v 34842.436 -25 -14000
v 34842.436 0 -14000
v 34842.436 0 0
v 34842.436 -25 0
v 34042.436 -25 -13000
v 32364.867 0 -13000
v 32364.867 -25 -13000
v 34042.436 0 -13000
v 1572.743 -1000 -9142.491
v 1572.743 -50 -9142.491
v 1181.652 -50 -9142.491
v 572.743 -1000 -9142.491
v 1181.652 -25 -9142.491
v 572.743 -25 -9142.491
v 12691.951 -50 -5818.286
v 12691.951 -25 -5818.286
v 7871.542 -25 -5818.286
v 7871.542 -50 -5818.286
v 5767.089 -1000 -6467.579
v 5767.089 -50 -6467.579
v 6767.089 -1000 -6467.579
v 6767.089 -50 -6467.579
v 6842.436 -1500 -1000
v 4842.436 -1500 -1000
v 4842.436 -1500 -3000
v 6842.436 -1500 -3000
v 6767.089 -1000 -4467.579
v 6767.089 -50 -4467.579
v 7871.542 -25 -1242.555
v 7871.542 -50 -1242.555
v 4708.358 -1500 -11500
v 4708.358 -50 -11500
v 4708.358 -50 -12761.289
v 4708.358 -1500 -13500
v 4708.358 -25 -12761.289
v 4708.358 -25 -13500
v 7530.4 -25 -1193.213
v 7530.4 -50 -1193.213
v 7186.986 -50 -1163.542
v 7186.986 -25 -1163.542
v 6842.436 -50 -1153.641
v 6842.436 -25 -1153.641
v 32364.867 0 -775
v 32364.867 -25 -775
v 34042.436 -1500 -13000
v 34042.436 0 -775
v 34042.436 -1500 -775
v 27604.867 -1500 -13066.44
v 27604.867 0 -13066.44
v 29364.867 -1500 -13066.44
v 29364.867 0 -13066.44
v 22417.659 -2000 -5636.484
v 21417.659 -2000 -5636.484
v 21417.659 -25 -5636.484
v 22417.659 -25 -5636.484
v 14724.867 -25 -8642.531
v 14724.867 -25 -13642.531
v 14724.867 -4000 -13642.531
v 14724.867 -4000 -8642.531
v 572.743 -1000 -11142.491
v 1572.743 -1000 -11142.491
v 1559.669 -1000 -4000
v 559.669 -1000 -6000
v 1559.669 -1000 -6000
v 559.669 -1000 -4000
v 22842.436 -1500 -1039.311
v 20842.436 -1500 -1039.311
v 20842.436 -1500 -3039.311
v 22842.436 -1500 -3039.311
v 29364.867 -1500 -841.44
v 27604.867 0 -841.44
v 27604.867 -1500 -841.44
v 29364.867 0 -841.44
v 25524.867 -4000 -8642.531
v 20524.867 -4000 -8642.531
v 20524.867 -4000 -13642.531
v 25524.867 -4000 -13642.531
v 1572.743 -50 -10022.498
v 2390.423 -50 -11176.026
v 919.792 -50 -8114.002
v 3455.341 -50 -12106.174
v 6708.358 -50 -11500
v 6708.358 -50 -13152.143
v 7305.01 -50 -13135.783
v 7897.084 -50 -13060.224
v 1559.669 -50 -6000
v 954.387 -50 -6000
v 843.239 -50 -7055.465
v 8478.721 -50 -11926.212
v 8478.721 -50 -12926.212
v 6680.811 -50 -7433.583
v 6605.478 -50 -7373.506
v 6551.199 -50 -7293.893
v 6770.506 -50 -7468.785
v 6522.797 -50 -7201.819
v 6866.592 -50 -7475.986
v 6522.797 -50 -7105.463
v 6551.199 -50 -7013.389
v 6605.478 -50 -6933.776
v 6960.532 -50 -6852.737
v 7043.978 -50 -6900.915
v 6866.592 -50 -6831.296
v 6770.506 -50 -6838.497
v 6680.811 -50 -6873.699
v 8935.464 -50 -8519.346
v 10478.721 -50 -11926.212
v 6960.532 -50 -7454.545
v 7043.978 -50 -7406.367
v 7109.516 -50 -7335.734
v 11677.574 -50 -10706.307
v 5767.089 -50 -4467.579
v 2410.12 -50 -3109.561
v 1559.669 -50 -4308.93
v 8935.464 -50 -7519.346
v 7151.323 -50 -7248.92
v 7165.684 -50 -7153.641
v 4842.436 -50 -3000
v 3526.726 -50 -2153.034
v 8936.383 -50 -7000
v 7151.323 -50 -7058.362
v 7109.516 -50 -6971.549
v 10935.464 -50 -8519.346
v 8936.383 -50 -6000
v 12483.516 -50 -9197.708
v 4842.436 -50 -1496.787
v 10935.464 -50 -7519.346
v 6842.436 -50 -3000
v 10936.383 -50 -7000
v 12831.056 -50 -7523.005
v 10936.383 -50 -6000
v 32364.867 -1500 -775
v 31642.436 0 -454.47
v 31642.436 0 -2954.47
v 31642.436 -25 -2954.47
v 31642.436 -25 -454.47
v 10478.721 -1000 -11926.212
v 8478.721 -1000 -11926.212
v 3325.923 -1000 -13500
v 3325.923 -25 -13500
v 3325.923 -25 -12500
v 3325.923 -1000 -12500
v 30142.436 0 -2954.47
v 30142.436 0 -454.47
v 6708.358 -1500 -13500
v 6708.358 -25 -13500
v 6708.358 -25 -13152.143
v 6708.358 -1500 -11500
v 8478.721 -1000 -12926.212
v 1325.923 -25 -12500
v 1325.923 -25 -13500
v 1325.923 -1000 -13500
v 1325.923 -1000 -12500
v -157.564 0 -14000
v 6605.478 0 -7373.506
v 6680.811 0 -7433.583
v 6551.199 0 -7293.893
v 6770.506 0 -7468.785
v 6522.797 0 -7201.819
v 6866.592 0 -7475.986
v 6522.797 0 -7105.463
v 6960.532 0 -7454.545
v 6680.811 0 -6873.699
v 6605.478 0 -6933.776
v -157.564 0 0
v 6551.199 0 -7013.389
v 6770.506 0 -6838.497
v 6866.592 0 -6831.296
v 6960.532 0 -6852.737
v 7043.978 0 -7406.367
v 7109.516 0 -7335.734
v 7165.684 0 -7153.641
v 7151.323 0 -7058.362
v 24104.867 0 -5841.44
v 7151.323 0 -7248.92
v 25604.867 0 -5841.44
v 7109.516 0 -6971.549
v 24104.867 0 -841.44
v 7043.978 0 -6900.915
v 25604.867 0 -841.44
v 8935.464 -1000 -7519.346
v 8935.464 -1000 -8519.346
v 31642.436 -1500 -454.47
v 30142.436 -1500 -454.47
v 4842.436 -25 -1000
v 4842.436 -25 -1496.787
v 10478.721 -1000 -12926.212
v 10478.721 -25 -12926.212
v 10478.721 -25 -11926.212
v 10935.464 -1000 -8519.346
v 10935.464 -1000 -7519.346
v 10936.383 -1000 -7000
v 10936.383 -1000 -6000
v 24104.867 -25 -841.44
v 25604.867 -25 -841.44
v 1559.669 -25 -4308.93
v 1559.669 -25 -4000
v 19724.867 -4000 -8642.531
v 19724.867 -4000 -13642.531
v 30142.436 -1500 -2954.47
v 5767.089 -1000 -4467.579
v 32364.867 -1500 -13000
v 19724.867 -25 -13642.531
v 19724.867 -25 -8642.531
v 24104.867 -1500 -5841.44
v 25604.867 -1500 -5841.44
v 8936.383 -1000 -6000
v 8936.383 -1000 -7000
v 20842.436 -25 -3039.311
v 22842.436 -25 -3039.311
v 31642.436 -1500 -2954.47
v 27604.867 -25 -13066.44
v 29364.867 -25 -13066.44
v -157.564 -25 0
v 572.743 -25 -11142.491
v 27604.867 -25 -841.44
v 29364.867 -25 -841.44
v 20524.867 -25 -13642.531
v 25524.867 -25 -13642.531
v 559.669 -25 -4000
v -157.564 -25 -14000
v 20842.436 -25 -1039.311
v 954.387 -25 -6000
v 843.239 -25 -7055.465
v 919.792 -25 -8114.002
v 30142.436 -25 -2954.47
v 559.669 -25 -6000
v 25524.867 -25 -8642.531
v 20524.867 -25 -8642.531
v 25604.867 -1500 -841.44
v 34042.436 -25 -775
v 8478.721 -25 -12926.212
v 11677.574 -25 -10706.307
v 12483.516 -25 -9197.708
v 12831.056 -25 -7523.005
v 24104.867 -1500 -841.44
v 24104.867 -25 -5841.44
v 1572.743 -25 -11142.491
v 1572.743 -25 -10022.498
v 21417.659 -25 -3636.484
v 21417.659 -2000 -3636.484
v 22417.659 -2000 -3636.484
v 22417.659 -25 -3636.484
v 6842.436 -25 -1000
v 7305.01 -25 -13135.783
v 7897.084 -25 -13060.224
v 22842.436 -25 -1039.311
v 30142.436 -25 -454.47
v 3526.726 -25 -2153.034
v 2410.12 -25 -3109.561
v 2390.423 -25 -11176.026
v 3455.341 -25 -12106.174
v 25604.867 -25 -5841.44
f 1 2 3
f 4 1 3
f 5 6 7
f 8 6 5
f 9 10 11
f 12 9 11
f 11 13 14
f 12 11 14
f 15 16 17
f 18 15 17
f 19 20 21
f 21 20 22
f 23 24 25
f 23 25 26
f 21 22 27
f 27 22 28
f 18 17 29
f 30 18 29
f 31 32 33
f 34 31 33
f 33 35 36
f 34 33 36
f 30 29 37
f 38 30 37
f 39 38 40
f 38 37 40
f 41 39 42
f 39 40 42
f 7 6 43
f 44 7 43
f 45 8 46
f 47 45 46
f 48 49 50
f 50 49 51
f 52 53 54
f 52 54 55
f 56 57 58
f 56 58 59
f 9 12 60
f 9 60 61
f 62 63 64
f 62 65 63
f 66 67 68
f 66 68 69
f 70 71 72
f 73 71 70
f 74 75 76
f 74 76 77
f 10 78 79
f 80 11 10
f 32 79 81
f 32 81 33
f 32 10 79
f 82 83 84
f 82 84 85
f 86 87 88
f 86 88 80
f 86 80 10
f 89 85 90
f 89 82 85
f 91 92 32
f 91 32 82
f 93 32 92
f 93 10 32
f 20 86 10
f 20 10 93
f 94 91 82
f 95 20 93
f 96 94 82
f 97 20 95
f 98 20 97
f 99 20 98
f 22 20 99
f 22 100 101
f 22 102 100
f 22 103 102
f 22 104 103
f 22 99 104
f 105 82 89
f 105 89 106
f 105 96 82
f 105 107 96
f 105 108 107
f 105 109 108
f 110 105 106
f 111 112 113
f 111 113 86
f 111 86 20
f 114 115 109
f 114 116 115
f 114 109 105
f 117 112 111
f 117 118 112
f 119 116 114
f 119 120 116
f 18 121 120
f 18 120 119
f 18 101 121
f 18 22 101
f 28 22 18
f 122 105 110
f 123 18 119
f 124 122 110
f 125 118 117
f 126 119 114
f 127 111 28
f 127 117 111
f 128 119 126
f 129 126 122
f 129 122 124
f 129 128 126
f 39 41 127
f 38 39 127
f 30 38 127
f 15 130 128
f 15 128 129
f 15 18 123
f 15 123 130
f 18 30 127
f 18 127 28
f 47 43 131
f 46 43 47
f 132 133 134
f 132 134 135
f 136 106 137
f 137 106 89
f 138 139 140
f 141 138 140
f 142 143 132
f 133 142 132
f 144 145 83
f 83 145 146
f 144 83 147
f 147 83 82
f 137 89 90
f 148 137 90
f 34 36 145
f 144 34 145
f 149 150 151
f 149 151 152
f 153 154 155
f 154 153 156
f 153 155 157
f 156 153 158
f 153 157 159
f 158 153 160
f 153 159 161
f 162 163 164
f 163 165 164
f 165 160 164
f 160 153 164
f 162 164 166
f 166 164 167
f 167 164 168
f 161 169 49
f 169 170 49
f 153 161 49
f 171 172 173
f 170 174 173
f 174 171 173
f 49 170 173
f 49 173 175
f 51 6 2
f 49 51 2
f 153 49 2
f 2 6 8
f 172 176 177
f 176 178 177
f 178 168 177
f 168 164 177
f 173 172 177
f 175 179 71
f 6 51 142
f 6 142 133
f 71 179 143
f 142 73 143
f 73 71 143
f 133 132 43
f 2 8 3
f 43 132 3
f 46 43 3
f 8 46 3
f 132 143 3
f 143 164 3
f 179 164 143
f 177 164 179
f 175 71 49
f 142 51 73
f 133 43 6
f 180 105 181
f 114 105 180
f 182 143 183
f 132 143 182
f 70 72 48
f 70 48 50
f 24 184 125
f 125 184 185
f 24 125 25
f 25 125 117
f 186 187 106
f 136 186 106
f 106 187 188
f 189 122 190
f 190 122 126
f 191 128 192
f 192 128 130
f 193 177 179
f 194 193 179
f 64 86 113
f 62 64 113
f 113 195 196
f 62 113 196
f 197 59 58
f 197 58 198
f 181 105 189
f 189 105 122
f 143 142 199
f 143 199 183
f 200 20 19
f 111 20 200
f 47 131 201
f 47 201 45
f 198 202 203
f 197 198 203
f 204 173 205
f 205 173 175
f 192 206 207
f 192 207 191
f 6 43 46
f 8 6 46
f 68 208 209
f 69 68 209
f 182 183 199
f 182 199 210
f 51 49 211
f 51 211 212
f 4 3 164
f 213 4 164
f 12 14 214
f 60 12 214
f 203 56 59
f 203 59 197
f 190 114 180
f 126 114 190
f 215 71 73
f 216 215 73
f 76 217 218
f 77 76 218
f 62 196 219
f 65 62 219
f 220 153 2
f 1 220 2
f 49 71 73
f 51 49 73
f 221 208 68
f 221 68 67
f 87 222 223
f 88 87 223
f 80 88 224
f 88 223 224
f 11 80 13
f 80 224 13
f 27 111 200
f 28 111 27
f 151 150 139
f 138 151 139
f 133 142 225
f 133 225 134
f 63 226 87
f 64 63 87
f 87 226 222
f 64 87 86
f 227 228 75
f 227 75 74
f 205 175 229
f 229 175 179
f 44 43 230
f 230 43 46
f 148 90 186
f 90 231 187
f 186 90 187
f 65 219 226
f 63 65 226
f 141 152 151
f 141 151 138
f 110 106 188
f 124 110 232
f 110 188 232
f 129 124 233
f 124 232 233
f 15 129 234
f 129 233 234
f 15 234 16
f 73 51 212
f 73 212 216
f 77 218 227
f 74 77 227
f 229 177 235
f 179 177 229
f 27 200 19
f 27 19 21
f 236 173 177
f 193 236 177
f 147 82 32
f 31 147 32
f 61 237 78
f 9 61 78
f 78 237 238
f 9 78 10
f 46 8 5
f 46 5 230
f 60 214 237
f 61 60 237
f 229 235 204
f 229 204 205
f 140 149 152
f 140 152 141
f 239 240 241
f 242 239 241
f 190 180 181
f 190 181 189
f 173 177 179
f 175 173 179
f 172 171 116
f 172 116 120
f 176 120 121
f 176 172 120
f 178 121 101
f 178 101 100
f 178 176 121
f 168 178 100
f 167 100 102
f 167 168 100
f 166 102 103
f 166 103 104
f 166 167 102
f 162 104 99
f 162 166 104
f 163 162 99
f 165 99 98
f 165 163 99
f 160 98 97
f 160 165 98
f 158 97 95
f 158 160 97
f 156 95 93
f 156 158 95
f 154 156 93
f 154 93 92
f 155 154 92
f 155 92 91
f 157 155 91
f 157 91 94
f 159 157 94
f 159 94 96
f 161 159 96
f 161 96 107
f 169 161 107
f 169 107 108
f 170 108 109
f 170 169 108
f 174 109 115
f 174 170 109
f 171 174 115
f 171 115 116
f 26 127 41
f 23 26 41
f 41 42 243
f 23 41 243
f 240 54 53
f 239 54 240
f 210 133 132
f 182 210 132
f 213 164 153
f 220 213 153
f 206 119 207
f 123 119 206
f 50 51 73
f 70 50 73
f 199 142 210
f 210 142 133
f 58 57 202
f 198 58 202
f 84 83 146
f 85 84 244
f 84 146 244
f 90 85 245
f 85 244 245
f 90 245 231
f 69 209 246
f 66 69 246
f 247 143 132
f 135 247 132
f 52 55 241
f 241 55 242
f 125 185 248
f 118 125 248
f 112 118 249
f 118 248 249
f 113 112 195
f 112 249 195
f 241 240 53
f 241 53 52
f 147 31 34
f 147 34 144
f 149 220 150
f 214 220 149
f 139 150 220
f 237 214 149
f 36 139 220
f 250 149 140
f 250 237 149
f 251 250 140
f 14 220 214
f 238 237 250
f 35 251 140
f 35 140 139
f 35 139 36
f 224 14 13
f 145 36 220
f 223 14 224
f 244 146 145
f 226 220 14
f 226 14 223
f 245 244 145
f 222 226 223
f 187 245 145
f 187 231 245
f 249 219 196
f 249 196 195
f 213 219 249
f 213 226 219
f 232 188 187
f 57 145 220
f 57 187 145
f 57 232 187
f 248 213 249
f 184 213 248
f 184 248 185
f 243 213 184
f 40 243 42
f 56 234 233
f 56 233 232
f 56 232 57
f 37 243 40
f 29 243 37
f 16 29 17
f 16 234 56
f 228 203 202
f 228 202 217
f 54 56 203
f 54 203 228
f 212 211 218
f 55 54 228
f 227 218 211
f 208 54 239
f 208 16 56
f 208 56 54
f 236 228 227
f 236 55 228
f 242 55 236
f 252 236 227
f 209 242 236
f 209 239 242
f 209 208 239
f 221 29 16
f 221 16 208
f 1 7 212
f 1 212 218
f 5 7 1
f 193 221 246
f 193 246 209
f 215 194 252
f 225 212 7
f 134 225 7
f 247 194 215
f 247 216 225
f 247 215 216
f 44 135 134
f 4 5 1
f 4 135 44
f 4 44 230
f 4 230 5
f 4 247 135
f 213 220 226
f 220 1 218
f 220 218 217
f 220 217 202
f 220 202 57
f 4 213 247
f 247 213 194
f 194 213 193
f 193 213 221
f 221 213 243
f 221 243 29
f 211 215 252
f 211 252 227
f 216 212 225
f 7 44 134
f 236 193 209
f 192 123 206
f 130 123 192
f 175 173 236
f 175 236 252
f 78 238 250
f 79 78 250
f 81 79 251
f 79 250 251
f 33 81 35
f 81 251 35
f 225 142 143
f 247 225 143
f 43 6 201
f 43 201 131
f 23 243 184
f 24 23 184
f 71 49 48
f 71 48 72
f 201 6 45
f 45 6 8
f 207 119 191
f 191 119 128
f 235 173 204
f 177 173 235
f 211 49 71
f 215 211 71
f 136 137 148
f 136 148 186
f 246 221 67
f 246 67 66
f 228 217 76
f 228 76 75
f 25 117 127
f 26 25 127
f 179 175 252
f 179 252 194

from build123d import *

# Parameters (mm, degrees)
F0_W     = 1677.5682196007
F0_H     = 12225
F1_DEPTH = 1500
F0_W_2   = 1760
F0_W_3   = 1500
F0_H_2   = 5000
F0_H_3   = 2500
F0_W_4   = 2000
F0_H_4   = 1000
F0_W_5   = 5000
F0_W_6   = 1000
F0_H_5   = 2000
F0_W_7   = 4531.0974121094
F0_H_6   = 6739.2702102661
F2_DEPTH = 25
F3_DEPTH = 4000
F4_DEPTH = 1500
F0_R     = 323.2486939486
F5_DEPTH = 50
F6_DEPTH = 2000
F7_DEPTH = 25
F8_DEPTH = 1000


# Not quite as in the source:
# - a feature names something its author has since deleted; it is built from what else it names


with BuildPart() as f1:
    # F0 (on Front) → F1 (new body)
    with BuildSketch(Plane.XZ):
        with Locations((33203.6515982442, -6887.5)):
            Rectangle(F0_W, F0_H)
    extrude(amount=F1_DEPTH)


with BuildPart() as f1b:
    # F0 (on Front) → F1, piece 2 (new body)
    with BuildSketch(Plane.XZ):
        with Locations((28484.8674884439, -6953.9399623871)):
            Rectangle(F0_W_2, F0_H)
    extrude(amount=F1_DEPTH)


with BuildPart() as f1c:
    # F0 (on Front) → F1, piece 3 (new body)
    with BuildSketch(Plane.XZ):
        with Locations((24854.8674884439, -3341.4399623871)):
            Rectangle(F0_W_3, F0_H_2)
    extrude(amount=F1_DEPTH)


with BuildPart() as f1d:
    # F0 (on Front) → F1, piece 4 (new body)
    with BuildSketch(Plane.XZ):
        with Locations((30892.4357080446, -1704.4703960419)):
            Rectangle(F0_W_3, F0_H_3)
    extrude(amount=F1_DEPTH)


with BuildPart() as f2:
    # F0 (on Front) → F2 (new body)
    with BuildSketch(Plane.XZ):
        Polygon((15060.6956481934, 0), (-157.5642919554, 0), (-157.5642919554, -14000), (34842.4357080446, -14000), (34842.4357080446, 0), (19591.7930603027, 0), (19591.7930603027, -6739.2702102661), (15060.6956481934, -6739.2702102661), align=None)
        with Locations((2325.9228467941, -13000)):
            Rectangle(F0_W_4, F0_H_4, mode=Mode.SUBTRACT)
        with Locations((17224.8674884439, -11142.5313949585)):
            Rectangle(F0_W_5, F0_H_2, mode=Mode.SUBTRACT)
        with BuildLine():
            Line((10478.7209733374, -12926.2115996243), (8478.7209733374, -12926.2115996243))
            ThreePointArc((8478.7209733374, -12926.2115996243), (7601.9868729202, -13105.3703999085), (6708.3578109742, -13152.142808433))
            Line((6708.3578109741, -13152.142808433), (6708.3578109741, -13500))
            Line((6708.3578109741, -13500), (4708.3578109741, -13500))
            Line((4708.3578109741, -13500), (4708.3578109741, -12761.2886622132))
            ThreePointArc((4708.3578109742, -12761.2886622131), (2895.3863427984, -11672.5791421162), (1572.7429986001, -10022.497766057))
            Line((1572.7429986, -10022.4977660571), (1572.7429986, -11142.4913406372))
            Line((1572.7429986, -11142.4913406372), (572.7429986, -11142.4913406372))
            Line((572.7429986, -11142.4913406372), (572.7429986, -9142.4913406372))
            Line((572.7429986, -9142.4913406372), (1181.6517873175, -9142.4913406372))
            ThreePointArc((1181.6517873175, -9142.4913406372), (858.0648867062, -7586.4295539984), (954.3874504445, -5999.9999999999))
            Line((954.3874504445, -6000), (559.6692562103, -6000))
            Line((559.6692562103, -6000), (559.6692562103, -4000))
            Line((559.6692562103, -4000), (1559.6692562103, -4000))
            Line((1559.6692562103, -4000), (1559.6692562103, -4308.9304307886))
            ThreePointArc((1559.6692562102, -4308.9304307885), (2939.0128869101, -2596.9657152915), (4842.4357080447, -1496.7868195462))
            Line((4842.4357080446, -1496.7868195462), (4842.4357080446, -1000))
            Line((4842.4357080446, -1000), (6842.4357080446, -1000))
            Line((6842.4357080446, -1000), (6842.4357080446, -1153.6410690386))
            ThreePointArc((6842.4357080447, -1153.6410690386), (7358.9059893254, -1175.9108602927), (7871.5423754885, -1242.5549195207))
            Line((7871.5423754883, -1242.5549195207), (7871.5423754883, -546.0254189148))
            Line((7871.5423754883, -546.0254189148), (13195.7473754883, -546.0254189148))
            Line((13195.7473754883, -546.0254189148), (13195.7473754883, -5818.2864189148))
            Line((13195.7473754883, -5818.2864189148), (12691.9508980747, -5818.2864189148))
            ThreePointArc((12691.9508980747, -5818.2864189149), (12804.695813918, -6481.7374822721), (12842.4357080446, -7153.6410690386))
            ThreePointArc((12842.4357080446, -7153.6410690386), (12219.1313285794, -9816.5613089485), (10478.7209733374, -11926.2115996243))
            Line((10478.7209733374, -11926.2115996243), (10478.7209733374, -12926.2115996243))
        make_face(mode=Mode.SUBTRACT)
        with Locations((23024.8674884439, -11142.5313949585)):
            Rectangle(F0_W_5, F0_H_2, mode=Mode.SUBTRACT)
        with Locations((21917.658996582, -4636.4841461182)):
            Rectangle(F0_W_6, F0_H_5, mode=Mode.SUBTRACT)
        with Locations((28484.8674884439, -6953.9399623871)):
            Rectangle(F0_W_2, F0_H, mode=Mode.SUBTRACT)
        with Locations((33203.6515982442, -6887.5)):
            Rectangle(F0_W, F0_H, mode=Mode.SUBTRACT)
        with Locations((24854.8674884439, -3341.4399623871)):
            Rectangle(F0_W_3, F0_H_2, mode=Mode.SUBTRACT)
        with Locations((21842.4357080446, -2039.3109321594)):
            Rectangle(F0_W_4, F0_H_5, mode=Mode.SUBTRACT)
        with Locations((30892.4357080446, -1704.4703960419)):
            Rectangle(F0_W_3, F0_H_3, mode=Mode.SUBTRACT)
        with Locations((17326.244354248, -3369.6351051331)):
            Rectangle(F0_W_7, F0_H_6)
        with BuildLine():
            Line((7871.5423754883, -5818.2864189148), (12691.9508980747, -5818.2864189148))
            ThreePointArc((12691.9508980747, -5818.2864189149), (10973.1970607696, -2801.9964779865), (7871.5423754885, -1242.5549195207))
            Line((7871.5423754883, -1242.5549195207), (7871.5423754883, -5818.2864189148))
        make_face()
        with BuildLine():
            ThreePointArc((7871.5423754885, -1242.5549195207), (10973.1970607696, -2801.9964779865), (12691.9508980747, -5818.2864189149))
            Line((12691.9508980747, -5818.2864189148), (13195.7473754883, -5818.2864189148))
            Line((13195.7473754883, -5818.2864189148), (13195.7473754883, -546.0254189148))
            Line((13195.7473754883, -546.0254189148), (7871.5423754883, -546.0254189148))
            Line((7871.5423754883, -546.0254189148), (7871.5423754883, -1242.5549195207))
        make_face()
    extrude(amount=F2_DEPTH)

    # F0 (on Front) → F3 (join)
    with BuildSketch(Plane.XZ):
        with Locations((17224.8674884439, -11142.5313949585)):
            Rectangle(F0_W_5, F0_H_2)
        with Locations((23024.8674884439, -11142.5313949585)):
            Rectangle(F0_W_5, F0_H_2)
    extrude(amount=F3_DEPTH)

    # F0 (on Front) → F4 (join)
    with BuildSketch(Plane.XZ):
        with BuildLine():
            Line((6842.4357080446, -3000), (6842.4357080446, -1153.6410690386))
            ThreePointArc((6842.4357080447, -1153.6410690386), (5827.8238356901, -1240.0497111177), (4842.4357080447, -1496.7868195462))
            Line((4842.4357080446, -1496.7868195462), (4842.4357080446, -3000))
            Line((4842.4357080446, -3000), (6842.4357080446, -3000))
        make_face()
        with BuildLine():
            ThreePointArc((4842.4357080447, -1496.7868195462), (5827.8238356901, -1240.0497111177), (6842.4357080447, -1153.6410690386))
            Line((6842.4357080446, -1153.6410690386), (6842.4357080446, -1000))
            Line((6842.4357080446, -1000), (4842.4357080446, -1000))
            Line((4842.4357080446, -1000), (4842.4357080446, -1496.7868195462))
        make_face()
        with BuildLine():
            ThreePointArc((4708.3578109742, -12761.2886622131), (5691.6427564117, -13042.2466410287), (6708.3578109742, -13152.142808433))
            Line((6708.3578109741, -13152.142808433), (6708.3578109741, -11500))
            Line((6708.3578109741, -11500), (4708.3578109741, -11500))
            Line((4708.3578109741, -11500), (4708.3578109741, -12761.2886622132))
        make_face()
        with BuildLine():
            Line((6708.3578109741, -13500), (6708.3578109741, -13152.142808433))
            ThreePointArc((6708.3578109742, -13152.142808433), (5691.6427564117, -13042.2466410287), (4708.3578109742, -12761.2886622131))
            Line((4708.3578109741, -12761.2886622132), (4708.3578109741, -13500))
            Line((4708.3578109741, -13500), (6708.3578109741, -13500))
        make_face()
        with Locations((21842.4357080446, -2039.3109321594)):
            Rectangle(F0_W_4, F0_H_5)
    extrude(amount=F4_DEPTH)

    # F0 (on Front) → F5 (join)
    with BuildSketch(Plane.XZ):
        with BuildLine():
            ThreePointArc((6708.3578109742, -13152.142808433), (7601.9868729202, -13105.3703999085), (8478.7209733374, -12926.2115996243))
            Line((8478.7209733374, -12926.2115996243), (8478.7209733374, -11926.2115996243))
            Line((8478.7209733374, -11926.2115996243), (10478.7209733374, -11926.2115996243))
            ThreePointArc((10478.7209733374, -11926.2115996243), (12219.1313285794, -9816.5613089485), (12842.4357080446, -7153.6410690386))
            ThreePointArc((12842.4357080446, -7153.6410690386), (12804.695813918, -6481.7374822721), (12691.9508980747, -5818.2864189149))
            Line((12691.9508980747, -5818.2864189148), (7871.5423754883, -5818.2864189148))
            Line((7871.5423754883, -5818.2864189148), (7871.5423754883, -1242.5549195207))
            ThreePointArc((7871.5423754885, -1242.5549195207), (7358.9059893254, -1175.9108602927), (6842.4357080447, -1153.6410690386))
            Line((6842.4357080446, -1153.6410690386), (6842.4357080446, -3000))
            Line((6842.4357080446, -3000), (4842.4357080446, -3000))
            Line((4842.4357080446, -3000), (4842.4357080446, -1496.7868195462))
            ThreePointArc((4842.4357080447, -1496.7868195462), (2939.0128869101, -2596.9657152915), (1559.6692562102, -4308.9304307885))
            Line((1559.6692562103, -4308.9304307886), (1559.6692562103, -6000))
            Line((1559.6692562103, -6000), (954.3874504445, -6000))
            ThreePointArc((954.3874504445, -5999.9999999999), (858.0648867062, -7586.4295539984), (1181.6517873175, -9142.4913406372))
            Line((1181.6517873175, -9142.4913406372), (1572.7429986, -9142.4913406372))
            Line((1572.7429986, -9142.4913406372), (1572.7429986, -10022.4977660571))
            ThreePointArc((1572.7429986001, -10022.497766057), (2895.3863427984, -11672.5791421162), (4708.3578109742, -12761.2886622131))
            Line((4708.3578109741, -12761.2886622132), (4708.3578109741, -11500))
            Line((4708.3578109741, -11500), (6708.3578109741, -11500))
            Line((6708.3578109741, -11500), (6708.3578109741, -13152.142808433))
        make_face()
        with Locations((6842.4357080446, -7153.6410690386)):
            Circle(F0_R, mode=Mode.SUBTRACT)
        with Locations((9935.4639053345, -8019.3462371826)):
            Rectangle(F0_W_4, F0_H_4, mode=Mode.SUBTRACT)
        with Locations((6267.0893669128, -5467.5793647766)):
            Rectangle(F0_W_6, F0_H_5, mode=Mode.SUBTRACT)
        with Locations((9936.3832473755, -6500)):
            Rectangle(F0_W_4, F0_H_4, mode=Mode.SUBTRACT)
    extrude(amount=F5_DEPTH)

    # F0 (on Front) → F6 (join)
    with BuildSketch(Plane.XZ):
        with Locations((21917.658996582, -4636.4841461182)):
            Rectangle(F0_W_6, F0_H_5)
    extrude(amount=F6_DEPTH)

    # F0 (on Front) → F7 (join)
    with BuildSketch(Plane.XZ):
        with Locations((9936.3832473755, -6500)):
            Rectangle(F0_W_4, F0_H_4)
    extrude(amount=F7_DEPTH)

    # F0 (on Front) → F8 (join)
    with BuildSketch(Plane.XZ):
        with Locations((6267.0893669128, -5467.5793647766)):
            Rectangle(F0_W_6, F0_H_5)
        with BuildLine():
            Line((559.6692562103, -6000), (954.3874504445, -6000))
            ThreePointArc((954.3874504445, -5999.9999999999), (1193.3911525372, -5131.6876546661), (1559.6692562102, -4308.9304307885))
            Line((1559.6692562103, -4308.9304307886), (1559.6692562103, -4000))
            Line((1559.6692562103, -4000), (559.6692562103, -4000))
            Line((559.6692562103, -4000), (559.6692562103, -6000))
        make_face()
        with BuildLine():
            ThreePointArc((1559.6692562102, -4308.9304307885), (1193.3911525372, -5131.6876546661), (954.3874504445, -5999.9999999999))
            Line((954.3874504445, -6000), (1559.6692562103, -6000))
            Line((1559.6692562103, -6000), (1559.6692562103, -4308.9304307886))
        make_face()
        with BuildLine():
            Line((1572.7429986, -11142.4913406372), (1572.7429986, -10022.4977660571))
            ThreePointArc((1572.7429986001, -10022.497766057), (1359.5137983438, -9590.3534714618), (1181.6517873175, -9142.4913406372))
            Line((1181.6517873175, -9142.4913406372), (572.7429986, -9142.4913406372))
            Line((572.7429986, -9142.4913406372), (572.7429986, -11142.4913406372))
            Line((572.7429986, -11142.4913406372), (1572.7429986, -11142.4913406372))
        make_face()
        with BuildLine():
            ThreePointArc((1181.6517873175, -9142.4913406372), (1359.5137983438, -9590.3534714618), (1572.7429986001, -10022.497766057))
            Line((1572.7429986, -10022.4977660571), (1572.7429986, -9142.4913406372))
            Line((1572.7429986, -9142.4913406372), (1181.6517873175, -9142.4913406372))
        make_face()
        with Locations((2325.9228467941, -13000)):
            Rectangle(F0_W_4, F0_H_4)
        with BuildLine():
            Line((8478.7209733374, -11926.2115996243), (8478.7209733374, -12926.2115996243))
            ThreePointArc((8478.7209733374, -12926.2115996243), (9525.7172810443, -12520.2042150381), (10478.7209733374, -11926.2115996243))
            Line((10478.7209733374, -11926.2115996243), (8478.7209733374, -11926.2115996243))
        make_face()
        with BuildLine():
            ThreePointArc((10478.7209733374, -11926.2115996243), (9525.7172810443, -12520.2042150381), (8478.7209733374, -12926.2115996243))
            Line((8478.7209733374, -12926.2115996243), (10478.7209733374, -12926.2115996243))
            Line((10478.7209733374, -12926.2115996243), (10478.7209733374, -11926.2115996243))
        make_face()
        with Locations((9935.4639053345, -8019.3462371826)):
            Rectangle(F0_W_4, F0_H_4)
        with Locations((9936.3832473755, -6500)):
            Rectangle(F0_W_4, F0_H_4)
    extrude(amount=F8_DEPTH)


solid = Compound([f1.part, f1b.part, f1c.part, f1d.part, f2.part])
